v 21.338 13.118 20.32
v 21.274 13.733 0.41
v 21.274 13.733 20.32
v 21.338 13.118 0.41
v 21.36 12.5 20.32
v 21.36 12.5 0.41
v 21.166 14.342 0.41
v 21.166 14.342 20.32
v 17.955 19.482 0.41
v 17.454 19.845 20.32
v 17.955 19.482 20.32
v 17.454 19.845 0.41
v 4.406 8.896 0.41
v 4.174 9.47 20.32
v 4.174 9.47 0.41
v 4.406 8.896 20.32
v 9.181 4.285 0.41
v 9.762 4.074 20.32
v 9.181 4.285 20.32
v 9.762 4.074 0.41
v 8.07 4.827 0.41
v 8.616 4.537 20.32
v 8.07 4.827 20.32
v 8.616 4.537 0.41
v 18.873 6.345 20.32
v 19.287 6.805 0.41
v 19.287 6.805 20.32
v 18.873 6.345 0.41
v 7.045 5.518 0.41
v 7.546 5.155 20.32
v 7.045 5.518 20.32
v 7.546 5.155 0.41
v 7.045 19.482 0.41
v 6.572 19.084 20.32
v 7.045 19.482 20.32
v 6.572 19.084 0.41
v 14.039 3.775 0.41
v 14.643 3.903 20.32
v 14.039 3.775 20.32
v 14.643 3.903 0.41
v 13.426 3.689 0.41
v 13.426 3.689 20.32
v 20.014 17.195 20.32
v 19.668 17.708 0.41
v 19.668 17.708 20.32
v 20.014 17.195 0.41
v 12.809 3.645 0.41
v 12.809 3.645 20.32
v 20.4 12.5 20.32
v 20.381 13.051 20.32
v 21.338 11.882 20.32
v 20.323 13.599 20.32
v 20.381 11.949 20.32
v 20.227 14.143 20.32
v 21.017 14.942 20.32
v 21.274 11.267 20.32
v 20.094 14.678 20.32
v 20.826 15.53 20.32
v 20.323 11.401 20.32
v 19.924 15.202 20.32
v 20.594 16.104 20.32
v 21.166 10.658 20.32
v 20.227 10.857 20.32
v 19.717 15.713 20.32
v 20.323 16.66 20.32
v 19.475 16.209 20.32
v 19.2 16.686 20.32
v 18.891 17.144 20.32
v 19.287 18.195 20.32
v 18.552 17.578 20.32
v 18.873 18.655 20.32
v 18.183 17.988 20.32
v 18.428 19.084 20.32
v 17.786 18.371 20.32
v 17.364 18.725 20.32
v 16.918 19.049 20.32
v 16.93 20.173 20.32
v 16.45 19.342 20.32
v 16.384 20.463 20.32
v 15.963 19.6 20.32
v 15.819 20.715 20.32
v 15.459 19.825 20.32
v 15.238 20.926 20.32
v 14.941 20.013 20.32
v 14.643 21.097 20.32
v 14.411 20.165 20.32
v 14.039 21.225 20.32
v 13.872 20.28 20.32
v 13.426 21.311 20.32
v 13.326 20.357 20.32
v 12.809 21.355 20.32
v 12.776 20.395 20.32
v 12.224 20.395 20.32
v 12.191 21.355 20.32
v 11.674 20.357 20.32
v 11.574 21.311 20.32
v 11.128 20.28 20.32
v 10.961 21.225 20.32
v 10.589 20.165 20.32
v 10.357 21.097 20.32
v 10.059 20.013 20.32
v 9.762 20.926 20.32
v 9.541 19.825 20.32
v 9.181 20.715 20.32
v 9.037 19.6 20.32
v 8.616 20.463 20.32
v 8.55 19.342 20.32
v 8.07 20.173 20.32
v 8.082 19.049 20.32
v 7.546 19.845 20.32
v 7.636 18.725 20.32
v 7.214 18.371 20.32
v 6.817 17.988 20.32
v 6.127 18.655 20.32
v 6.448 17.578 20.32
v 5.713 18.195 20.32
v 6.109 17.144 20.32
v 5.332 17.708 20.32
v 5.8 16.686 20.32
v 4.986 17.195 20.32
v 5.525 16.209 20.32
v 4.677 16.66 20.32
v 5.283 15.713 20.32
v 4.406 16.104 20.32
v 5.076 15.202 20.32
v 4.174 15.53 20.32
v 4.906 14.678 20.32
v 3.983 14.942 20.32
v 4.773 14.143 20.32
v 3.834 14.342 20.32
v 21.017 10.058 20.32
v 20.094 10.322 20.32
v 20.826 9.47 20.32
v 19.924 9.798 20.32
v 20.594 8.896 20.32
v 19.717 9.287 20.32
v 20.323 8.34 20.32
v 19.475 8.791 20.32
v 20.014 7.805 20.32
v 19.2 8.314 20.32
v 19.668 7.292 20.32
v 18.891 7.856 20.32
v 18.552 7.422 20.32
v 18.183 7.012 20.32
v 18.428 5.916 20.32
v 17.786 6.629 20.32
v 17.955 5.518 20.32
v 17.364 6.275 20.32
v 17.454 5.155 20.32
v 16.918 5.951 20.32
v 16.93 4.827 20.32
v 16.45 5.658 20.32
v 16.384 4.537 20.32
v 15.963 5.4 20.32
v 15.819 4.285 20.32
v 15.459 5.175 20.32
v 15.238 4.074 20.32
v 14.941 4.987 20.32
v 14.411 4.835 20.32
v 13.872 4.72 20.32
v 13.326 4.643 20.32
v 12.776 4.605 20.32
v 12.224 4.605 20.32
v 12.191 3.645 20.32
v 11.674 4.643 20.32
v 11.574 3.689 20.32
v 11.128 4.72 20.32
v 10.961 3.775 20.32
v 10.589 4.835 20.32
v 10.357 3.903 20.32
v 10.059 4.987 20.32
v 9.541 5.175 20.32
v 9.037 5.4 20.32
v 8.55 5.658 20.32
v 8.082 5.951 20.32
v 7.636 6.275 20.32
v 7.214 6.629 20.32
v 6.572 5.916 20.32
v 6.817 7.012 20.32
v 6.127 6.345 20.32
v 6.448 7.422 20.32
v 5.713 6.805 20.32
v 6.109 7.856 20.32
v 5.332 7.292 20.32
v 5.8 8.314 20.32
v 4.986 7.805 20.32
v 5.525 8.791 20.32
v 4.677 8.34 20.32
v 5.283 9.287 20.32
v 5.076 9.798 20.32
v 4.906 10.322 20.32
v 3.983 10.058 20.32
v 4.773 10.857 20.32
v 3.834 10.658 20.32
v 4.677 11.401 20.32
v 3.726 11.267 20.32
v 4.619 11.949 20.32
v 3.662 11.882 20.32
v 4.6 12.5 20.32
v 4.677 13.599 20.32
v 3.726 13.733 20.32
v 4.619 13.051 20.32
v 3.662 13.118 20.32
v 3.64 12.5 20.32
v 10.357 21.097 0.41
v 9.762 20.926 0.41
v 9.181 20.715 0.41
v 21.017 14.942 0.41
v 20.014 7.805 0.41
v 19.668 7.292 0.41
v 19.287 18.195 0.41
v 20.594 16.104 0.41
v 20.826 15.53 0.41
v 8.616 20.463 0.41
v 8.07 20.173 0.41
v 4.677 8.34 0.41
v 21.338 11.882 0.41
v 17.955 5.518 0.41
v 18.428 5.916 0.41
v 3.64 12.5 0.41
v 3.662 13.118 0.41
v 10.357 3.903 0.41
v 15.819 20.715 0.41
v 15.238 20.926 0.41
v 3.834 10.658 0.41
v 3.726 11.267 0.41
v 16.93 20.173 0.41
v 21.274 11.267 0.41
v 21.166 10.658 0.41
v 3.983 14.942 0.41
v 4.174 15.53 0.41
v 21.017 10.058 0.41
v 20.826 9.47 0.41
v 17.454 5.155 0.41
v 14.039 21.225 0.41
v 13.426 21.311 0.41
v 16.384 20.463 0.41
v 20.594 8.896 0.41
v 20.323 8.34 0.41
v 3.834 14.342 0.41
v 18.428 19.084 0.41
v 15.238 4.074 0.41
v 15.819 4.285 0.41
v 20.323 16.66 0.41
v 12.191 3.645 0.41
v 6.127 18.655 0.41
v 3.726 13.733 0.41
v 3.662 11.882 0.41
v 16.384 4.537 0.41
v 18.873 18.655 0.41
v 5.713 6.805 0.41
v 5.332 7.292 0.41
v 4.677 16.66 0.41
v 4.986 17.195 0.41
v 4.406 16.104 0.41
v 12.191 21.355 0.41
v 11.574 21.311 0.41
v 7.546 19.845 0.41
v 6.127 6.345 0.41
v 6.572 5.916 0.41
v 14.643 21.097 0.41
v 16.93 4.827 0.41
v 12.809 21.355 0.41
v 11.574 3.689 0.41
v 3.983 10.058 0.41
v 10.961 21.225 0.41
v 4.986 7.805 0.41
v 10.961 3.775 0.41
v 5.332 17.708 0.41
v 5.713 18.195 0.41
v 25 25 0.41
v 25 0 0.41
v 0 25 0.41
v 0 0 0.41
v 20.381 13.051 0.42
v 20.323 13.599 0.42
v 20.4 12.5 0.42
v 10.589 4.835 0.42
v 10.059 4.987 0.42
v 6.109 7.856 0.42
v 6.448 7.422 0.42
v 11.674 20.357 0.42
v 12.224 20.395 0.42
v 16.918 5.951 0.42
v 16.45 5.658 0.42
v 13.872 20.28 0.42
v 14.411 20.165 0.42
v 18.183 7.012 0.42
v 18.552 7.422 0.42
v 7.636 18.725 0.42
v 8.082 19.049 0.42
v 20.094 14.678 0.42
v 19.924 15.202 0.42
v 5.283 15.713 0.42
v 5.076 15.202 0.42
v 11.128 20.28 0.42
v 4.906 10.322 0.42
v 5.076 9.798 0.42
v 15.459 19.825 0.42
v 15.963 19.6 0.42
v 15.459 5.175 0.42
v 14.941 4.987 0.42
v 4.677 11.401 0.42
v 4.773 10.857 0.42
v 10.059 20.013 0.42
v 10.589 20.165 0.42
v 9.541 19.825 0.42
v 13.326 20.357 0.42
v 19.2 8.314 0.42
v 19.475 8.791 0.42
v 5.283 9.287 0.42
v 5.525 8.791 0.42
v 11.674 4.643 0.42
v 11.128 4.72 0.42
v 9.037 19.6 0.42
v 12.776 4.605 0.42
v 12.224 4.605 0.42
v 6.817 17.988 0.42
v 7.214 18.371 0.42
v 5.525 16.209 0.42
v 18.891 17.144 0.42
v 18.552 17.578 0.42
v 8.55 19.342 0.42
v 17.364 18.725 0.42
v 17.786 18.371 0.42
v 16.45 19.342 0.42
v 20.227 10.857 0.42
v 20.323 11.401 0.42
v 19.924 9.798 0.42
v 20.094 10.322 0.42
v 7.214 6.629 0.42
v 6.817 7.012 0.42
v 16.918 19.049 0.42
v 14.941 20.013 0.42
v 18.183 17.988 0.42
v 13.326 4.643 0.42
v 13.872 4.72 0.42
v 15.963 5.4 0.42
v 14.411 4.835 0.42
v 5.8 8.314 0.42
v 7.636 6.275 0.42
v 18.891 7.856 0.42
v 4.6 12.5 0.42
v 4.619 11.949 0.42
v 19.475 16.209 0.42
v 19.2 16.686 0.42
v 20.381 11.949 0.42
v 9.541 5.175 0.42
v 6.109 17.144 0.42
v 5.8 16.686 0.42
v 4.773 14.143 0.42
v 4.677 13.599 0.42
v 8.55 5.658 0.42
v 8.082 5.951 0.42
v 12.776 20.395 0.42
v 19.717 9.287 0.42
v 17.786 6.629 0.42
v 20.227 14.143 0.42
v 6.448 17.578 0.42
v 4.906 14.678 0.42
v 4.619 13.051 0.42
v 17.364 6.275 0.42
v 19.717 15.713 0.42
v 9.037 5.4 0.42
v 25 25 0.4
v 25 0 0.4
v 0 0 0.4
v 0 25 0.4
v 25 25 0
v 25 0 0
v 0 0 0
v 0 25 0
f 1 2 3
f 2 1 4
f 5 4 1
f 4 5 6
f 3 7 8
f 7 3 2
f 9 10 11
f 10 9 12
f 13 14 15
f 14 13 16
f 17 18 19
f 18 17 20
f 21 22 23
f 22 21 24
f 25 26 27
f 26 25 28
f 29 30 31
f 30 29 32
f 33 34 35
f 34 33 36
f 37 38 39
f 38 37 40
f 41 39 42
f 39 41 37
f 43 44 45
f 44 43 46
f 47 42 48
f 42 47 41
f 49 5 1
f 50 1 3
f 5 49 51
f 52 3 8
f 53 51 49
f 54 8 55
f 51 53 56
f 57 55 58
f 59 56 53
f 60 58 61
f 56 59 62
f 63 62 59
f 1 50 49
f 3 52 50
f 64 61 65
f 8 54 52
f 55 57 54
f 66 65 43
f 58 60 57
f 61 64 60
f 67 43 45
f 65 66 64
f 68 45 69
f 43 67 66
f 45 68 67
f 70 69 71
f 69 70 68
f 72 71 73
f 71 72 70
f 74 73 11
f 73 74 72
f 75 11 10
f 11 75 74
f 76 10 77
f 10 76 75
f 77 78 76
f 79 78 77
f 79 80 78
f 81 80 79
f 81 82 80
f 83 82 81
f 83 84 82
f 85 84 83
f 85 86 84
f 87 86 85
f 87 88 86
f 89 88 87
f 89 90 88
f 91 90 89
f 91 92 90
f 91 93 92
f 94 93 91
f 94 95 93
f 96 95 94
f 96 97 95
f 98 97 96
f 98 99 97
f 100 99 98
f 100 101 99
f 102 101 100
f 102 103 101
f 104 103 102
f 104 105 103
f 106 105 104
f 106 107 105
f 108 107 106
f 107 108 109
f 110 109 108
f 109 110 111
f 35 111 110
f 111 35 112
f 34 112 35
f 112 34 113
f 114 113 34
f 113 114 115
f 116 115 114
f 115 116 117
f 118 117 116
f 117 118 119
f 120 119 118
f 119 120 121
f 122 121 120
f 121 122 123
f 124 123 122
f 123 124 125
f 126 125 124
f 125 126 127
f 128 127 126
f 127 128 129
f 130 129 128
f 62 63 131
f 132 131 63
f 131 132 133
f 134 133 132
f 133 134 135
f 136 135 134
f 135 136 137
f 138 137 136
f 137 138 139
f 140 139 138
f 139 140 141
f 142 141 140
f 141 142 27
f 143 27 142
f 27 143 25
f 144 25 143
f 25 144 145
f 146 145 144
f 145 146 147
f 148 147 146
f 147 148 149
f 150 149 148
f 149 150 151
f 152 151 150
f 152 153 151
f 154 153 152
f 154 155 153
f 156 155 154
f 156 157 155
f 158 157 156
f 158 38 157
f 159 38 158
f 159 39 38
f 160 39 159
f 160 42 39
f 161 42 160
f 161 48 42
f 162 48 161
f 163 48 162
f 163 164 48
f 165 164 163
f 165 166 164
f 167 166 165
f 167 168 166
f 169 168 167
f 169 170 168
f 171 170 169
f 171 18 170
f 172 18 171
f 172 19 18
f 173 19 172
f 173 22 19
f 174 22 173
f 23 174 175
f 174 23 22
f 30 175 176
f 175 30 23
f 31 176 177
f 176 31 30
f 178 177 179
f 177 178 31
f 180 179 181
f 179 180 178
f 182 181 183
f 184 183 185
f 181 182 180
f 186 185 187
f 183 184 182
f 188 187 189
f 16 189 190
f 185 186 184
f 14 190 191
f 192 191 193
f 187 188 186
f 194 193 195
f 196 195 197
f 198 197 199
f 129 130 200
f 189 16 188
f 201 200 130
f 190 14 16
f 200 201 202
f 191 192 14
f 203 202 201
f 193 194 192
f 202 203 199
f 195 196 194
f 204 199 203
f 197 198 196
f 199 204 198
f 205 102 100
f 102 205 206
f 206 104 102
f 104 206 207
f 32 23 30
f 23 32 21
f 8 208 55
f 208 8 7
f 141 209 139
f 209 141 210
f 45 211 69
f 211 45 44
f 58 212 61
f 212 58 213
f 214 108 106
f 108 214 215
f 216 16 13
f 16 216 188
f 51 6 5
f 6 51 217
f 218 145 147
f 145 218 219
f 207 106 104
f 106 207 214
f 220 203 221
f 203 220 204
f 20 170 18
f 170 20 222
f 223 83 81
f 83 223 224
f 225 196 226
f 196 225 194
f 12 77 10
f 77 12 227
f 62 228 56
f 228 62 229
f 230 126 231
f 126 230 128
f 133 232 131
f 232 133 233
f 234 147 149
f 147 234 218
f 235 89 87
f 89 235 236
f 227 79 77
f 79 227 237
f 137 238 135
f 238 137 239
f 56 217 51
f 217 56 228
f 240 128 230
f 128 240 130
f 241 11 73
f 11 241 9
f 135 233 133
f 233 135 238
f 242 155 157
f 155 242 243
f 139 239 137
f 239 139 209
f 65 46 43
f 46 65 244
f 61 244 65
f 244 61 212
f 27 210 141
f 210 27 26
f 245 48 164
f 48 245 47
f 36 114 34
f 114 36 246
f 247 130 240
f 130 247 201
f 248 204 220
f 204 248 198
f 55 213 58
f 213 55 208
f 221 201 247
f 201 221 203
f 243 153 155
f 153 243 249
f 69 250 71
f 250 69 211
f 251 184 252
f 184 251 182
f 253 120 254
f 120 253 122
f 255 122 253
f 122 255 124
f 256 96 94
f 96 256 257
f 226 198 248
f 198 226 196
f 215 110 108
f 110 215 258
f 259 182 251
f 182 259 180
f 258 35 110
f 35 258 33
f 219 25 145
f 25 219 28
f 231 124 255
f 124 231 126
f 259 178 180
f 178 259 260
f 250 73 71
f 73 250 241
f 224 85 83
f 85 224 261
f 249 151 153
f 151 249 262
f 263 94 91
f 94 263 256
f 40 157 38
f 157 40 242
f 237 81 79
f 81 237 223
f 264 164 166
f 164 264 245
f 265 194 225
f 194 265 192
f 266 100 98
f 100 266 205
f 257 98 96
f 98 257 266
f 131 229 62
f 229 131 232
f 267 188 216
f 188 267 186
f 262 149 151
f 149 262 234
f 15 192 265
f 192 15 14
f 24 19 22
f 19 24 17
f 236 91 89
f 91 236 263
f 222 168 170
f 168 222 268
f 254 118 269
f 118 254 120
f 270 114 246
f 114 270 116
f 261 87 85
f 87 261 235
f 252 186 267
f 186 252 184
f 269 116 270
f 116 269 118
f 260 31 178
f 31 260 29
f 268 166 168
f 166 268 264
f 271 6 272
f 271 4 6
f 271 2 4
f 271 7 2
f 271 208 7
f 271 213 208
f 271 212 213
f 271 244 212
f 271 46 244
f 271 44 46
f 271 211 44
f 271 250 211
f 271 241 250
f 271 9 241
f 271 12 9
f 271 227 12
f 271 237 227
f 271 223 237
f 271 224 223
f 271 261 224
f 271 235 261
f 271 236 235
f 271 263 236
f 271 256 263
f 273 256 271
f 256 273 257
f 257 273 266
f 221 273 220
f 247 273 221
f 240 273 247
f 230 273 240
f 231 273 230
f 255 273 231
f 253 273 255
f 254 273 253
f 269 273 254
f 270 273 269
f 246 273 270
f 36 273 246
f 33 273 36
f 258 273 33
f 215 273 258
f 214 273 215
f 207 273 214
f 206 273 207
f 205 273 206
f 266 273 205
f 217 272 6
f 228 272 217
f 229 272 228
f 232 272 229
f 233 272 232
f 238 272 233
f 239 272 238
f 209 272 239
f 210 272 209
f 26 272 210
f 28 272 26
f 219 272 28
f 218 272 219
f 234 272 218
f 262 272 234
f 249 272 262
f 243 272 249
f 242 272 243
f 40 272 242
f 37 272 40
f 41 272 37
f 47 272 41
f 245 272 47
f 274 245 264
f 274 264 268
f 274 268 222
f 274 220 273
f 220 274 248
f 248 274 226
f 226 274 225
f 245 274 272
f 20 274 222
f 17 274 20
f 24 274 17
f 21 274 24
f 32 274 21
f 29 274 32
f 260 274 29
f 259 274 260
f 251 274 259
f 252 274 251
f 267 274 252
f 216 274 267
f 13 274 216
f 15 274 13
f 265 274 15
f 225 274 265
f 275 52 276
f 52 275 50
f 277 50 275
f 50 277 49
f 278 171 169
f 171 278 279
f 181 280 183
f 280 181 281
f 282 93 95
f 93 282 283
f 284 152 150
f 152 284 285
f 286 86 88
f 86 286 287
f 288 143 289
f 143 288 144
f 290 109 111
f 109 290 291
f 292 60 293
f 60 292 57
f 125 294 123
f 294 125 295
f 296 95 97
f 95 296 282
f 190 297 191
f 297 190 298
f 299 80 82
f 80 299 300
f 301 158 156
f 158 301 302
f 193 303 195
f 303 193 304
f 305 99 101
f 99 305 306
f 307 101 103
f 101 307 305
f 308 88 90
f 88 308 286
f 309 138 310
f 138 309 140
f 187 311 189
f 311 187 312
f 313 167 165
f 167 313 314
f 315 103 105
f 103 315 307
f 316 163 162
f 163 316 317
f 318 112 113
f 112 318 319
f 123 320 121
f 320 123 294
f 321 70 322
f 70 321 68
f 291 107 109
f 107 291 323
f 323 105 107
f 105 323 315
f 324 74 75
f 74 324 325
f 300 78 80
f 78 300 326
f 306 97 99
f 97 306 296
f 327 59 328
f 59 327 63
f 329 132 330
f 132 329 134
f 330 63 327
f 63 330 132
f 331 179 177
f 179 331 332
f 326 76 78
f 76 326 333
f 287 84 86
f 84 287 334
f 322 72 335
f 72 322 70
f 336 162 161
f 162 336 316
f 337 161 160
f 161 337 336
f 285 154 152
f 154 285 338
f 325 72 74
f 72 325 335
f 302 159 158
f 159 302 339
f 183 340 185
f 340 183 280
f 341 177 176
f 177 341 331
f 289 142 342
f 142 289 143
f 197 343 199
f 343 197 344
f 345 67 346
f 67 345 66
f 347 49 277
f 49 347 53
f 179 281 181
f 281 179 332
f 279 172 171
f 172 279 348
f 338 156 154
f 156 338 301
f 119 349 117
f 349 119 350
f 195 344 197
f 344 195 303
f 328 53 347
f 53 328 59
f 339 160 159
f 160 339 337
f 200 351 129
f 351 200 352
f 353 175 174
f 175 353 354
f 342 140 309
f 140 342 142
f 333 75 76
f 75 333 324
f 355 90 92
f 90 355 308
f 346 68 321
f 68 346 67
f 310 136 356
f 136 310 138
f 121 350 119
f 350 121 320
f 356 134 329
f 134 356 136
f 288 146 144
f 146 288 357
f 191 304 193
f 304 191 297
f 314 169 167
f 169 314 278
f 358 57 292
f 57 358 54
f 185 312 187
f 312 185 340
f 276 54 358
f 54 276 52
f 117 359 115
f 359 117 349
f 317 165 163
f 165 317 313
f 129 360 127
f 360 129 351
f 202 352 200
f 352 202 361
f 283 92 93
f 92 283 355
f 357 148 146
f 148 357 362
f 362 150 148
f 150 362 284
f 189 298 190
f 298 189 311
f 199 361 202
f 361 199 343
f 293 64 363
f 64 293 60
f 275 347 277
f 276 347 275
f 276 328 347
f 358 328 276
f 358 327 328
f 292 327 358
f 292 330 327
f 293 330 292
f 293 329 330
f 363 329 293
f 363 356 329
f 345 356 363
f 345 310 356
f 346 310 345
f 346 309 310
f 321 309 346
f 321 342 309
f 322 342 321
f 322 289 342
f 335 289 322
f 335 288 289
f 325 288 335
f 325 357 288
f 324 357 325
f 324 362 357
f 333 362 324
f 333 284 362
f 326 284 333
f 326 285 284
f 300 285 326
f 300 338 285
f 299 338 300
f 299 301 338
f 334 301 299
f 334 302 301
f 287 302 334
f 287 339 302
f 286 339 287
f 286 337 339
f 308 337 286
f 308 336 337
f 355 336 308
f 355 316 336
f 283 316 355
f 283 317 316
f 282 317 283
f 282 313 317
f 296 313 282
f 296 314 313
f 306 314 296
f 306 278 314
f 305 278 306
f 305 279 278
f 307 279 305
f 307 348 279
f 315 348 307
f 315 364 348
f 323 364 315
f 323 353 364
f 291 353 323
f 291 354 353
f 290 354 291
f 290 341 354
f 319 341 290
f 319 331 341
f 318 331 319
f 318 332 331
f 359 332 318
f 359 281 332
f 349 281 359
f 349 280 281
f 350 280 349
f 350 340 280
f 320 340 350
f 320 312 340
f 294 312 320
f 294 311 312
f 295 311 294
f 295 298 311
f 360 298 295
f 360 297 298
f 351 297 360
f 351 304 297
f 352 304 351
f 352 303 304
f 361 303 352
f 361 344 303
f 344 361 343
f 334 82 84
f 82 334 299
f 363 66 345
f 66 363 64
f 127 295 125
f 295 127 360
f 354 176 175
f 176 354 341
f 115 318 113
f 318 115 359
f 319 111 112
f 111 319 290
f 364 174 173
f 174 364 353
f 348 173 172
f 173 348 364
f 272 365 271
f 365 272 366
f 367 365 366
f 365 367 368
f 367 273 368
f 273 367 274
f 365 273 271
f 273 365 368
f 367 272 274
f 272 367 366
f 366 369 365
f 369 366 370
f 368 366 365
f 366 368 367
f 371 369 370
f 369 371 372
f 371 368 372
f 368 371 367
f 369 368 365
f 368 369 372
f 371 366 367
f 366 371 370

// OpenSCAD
// file: ../../Base/PlacementOptions.scad
// Fischertechnik Box Foundation
// Placement Options

// Alignment
NoAlign = 0;
AlignLeft = 1;
AlignBottom = 2;
AlignCenter = 3;
AlignRight = 4;
AlignTop = 5;

// Element rotation degree steps
rotations = [0, -90, -180, -270];

// Rotation
NoRotation = 0;
Rotate0 = 0;
Rotate90 = 1;
Rotate180 = 2;
Rotate270 = 3;

// Docking (seen from above)
NoDock = -1;
DockLeft = 0;
DockTop = 1;
DockRight = 2;
DockCorner = 2;
DockBottom = 3;

// Web corners
LowerLeft = 0;
UpperLeft = 1;
UpperRight = 2;
LowerRight = 3;

// Web position relative to corner
LeftOfCorner = 0;
RightOfCorner = 1;
// file: ../../Base/Boxes.scad
// Fischertechnik Box Foundation
// Pre-designed Boxes

use <Constants.scad>

include <PlacementOptions.scad>

box190Width = 190;
box190Depth = 130;
box130Width = 130;
box130Depth = 95;
boxUsageHeight = 33.9;
boxWallThickness = 2.4;
boxBaseThickness = 1.0;
boxWebWidth = 3.0;

// getBoxWallThickness()
// Gets the wall thickness of a Fischertechnik Box

function getBoxWallThickness() = boxWallThickness;

// Gets the usable height of a fischertechnik box
function getBoxUsageHeight() = boxUsageHeight;

// Gets the thickness of the Fischertechnik box base.
function getBoxBaseThickness() = boxBaseThickness;

// Gets the width of a box web
function getBoxWebWidth() = boxWebWidth;

// Gets the usable inner space of a Box 190 as an x/y-list
function getBox190Space() = [
    box190Width - 2*getBoxWallThickness(), 
    box190Depth - 2*getBoxWallThickness() ];

// Imports the Fischertechnik empty box 130x190 mm and places it at position 0,0
// 190x130 are the outer sizes, the inner space is slightly smaller. Use getBox190Space() to get the inner sizes.
// This module needs the STL file "Fischertechnik Box 130x190.stl" in the library path.
// The box is positioned that the usable inner space is at the 0,0,0 position. The

module Box190() {
    translate([-getBoxWallThickness(),-getBoxWallThickness(),-getBoxBaseThickness()])
        import("Fischertechnik Box 130x190.stl", convexity=3);
}

// Gets the usable inner space of a Box 130 as an x/y-list
function getBox130Space() = [
    box130Width - 2*getBoxWallThickness(), 
    box130Depth - 2*getBoxWallThickness() ];

// Imports the Fischertechnik empty box 95x130 mm and places it at position 0,0
// 190x130 are the outer sizes, the inner space is slightly smaller. Use getBox190Space() to get the inner sizes.
// This module needs the STL file "Fischertechnik Box 95x130.stl" in the library path.
// The box is positioned that the usable inner space is at the 0,0,0 position. The

module Box130() {
    translate([-getBoxWallThickness(),-getBoxWallThickness(),-getBoxBaseThickness()])
        import("Fischertechnik Box 95x130.stl", convexity=3);
}

// Creates a web at the specified box walls
// corner 0 = LowerLeft, 1 = UpperLeft, 2 = UpperRight, 3 = LowerRight
// side 0 = LeftOfCorner, 1 = RightOfCorner
// distance = Distance in mm from the corner
// box = inner width and depth of the box (default: Box 190)
// webWidth = length of the web (default is 3 mms)
// webThickness = thickness of the web (default is 1 mm)

module BoxWeb(corner, side, distance, box=getBox190Space(), webWidth=getBoxWebWidth(), webThickness=1.0) {
    sink = getBoxWallThickness()/2;

    width = (corner % 2 == 0) ? 
            (side == LeftOfCorner ? webWidth : webThickness) :
            (side == LeftOfCorner ? webThickness : webWidth);

    depth = (corner % 2 == 0) ? 
            (side == RightOfCorner ? webWidth : webThickness) :
            (side == RightOfCorner ? webThickness : webWidth);
    
    xDiff = corner == LowerLeft ? 
                (side == LeftOfCorner ? -sink : distance) :
            (corner == UpperLeft ?                
                (side == LeftOfCorner ? distance : -sink) :
            (corner == UpperRight ?
                (side == LeftOfCorner ? box.x-webWidth+sink : box.x-distance-webThickness) :
                (side == LeftOfCorner ? box.x-distance-webThickness: box.x-webWidth+sink)));

    yDiff = corner == LowerLeft ? 
                (side == RightOfCorner ? -sink : distance) :
            (corner == UpperLeft ?
                (side == RightOfCorner ? box.y-distance : box.y-webWidth+sink) :
            (corner == UpperRight ?
                (side == RightOfCorner ? box.y-webWidth+sink : box.y-distance) :
                (side == RightOfCorner ? distance : -sink)));
    
    translate([xDiff, yDiff, -getExcess()])
        cube([width, depth, boxUsageHeight + 2*getExcess()]);
}
// file: ../../Base/Rotation.scad
// Fischertechnik Box Foundation
// Geometry Helpers Rotation

include <PlacementOptions.scad>

// getRotatedSpace(space, rotation=NoRotation)
// Rotates the space dependent on the specified rotation

function getRotatedSpace(space, rotation=NoRotation) = [
    (rotation == Rotate90 || rotation == Rotate270) ? space.y : space.x,
    (rotation == Rotate90 || rotation == Rotate270) ? space.x : space.y
];

// Rotates the given space around the fixed left lower corner
// space = the space the children needs as width/depth list [width,depth]
// rotation = 0 Rotate0 degrees, 1 Rotate90 degrees, 2 Rotate180 degrees, 3 Rotate270 degrees (equivalent to -90)

module RotateFix(space, rotation=Rotate0) {
    dy = (rotation == Rotate0 || rotation == Rotate270) ? 0 :
        (rotation == Rotate90) ? space.x :
        space.y;
    dx = (rotation < Rotate180) ? 0 :
        (rotation == Rotate180) ? space.x :
        space.y;
    
    translate([dx, dy, 0])
        rotate([0, 0, rotations[rotation]])
            children();
}
// file: ../../Base/Alignment.scad
// Fischertechnik Box Foundation
// Geometry Helpers Alignment

include <PlacementOptions.scad>

// getAlignedX(elementWidth, spaceWidth, align=AlignRight, offset=0)
// Gets the aligned X offset of an element with the given
// width in the given space.
// elementWidth = The width of the element to positon
// spaceWidth = The space where the element should be aligned
// align = 0 AlignLeft, 1 AlignCenter, 2 AlignRight
// offset = an optional offset from the aligned position. When
// aligned left or centered, then positive values are in X direction.
// When aligned right then positive values are in negative X direction.

function getAlignedX(elementWidth, spaceWidth, align=AlignRight, offset=0) =
    (align == AlignLeft) ?
        offset :
        ((align == AlignCenter) ?
        (spaceWidth - elementWidth)/2 + offset :
        spaceWidth - offset - elementWidth);

// getAlignedY(elementDepth, spaceDepth, align=AlignTop, offset=0)
// Gets the aligned Y offset of an element with the given
// depth in the given space.
// elementDepth = The depth of the element to positon
// spaceDepth = The space where the element should be aligned
// align = 0 AlignBottom, 1 AlignCenter, 2 AlignTop
// offset = an optional offset from the aligned position. When
// aligned bottom or centered, then positive values are in Y direction.
// When aligned top then positive values are in negative Y direction.

function getAlignedY(elementDepth, spaceDepth, align=AlignTop, offset=0) =
    (align == AlignBottom) ?
        offset :
        ((align == AlignCenter) ?
        (spaceDepth - elementDepth)/2 + offset :
        spaceDepth - offset - elementDepth);
// file: ../../Base/Placement.scad
// Fischertechnik Box Foundation
// Geometry Helpers Placement

use <Constants.scad>
use <Alignment.scad>
use <Rotation.scad>
use <Boxes.scad>

include <PlacementOptions.scad>

// Place(x=0, y=0, elementSpace=[0,0], alignX=AlignLeft, alignY=AlignBottom, rotation=Rotate0, boxSpace=getBox190Space())
// Places the child at the specified position
// y = Y-Position. This is a relative position when an X aligment is specified.
// x = X-Position. This is a relative position when an Y aligment is specified.
// elementSpace = space of the element to be placed [x,y]
// alignX = -1=NoAlign, 0 AlignLeft, 1 AlignCenter, 3 AlignRight (elementSpace and boxSpace required!)
// alignY = -1=NoAlign, 2 AlignBottom, 1 AlignCenter, 4 AlignTop (elementSpace and boxSpace required!)
// rotation = 0 Rotate0 0 degrees, 1 Rotate90 90 degrees, 
// 2 Rotate180 180 degrees, 3 Rotate270 270 degrees (equivalent to -90)
// boxSpace = Inner space of the box where the placement occurs [x,y] - default is Box 190x130 inner space

module Place(x=0, y=0, elementSpace=[0,0], 
  alignX=AlignLeft, alignY=AlignBottom, 
  rotation=NoRotation, boxSpace=getBox190Space()) {

    module Position(x, y, space, rotation=Rotate0) {
        translate([x, y, 0])
            RotateFix(space, rotation)
                children();
    }

    space = getRotatedSpace(elementSpace, rotation);
    alignedX = getAlignedX(space.x, boxSpace.x, alignX, x);
    alignedY = getAlignedY(space.y, boxSpace.y, alignY, y);
    Position(alignedX, alignedY, elementSpace, rotation)
        children();
}

// Center(space=getBox130Space(), elementSpace=[0,0])
// space = Space where the children is centered. For cylinder use centered=true and no elementSpace.
// elementSpace = space of the element to be centered [x,y]

module Center(space=getBox190Space(), elementSpace=[0,0]) {
    translate([(space.x - elementSpace.x) / 2, (space.y - elementSpace.y) / 2])
        children(0);
}

// CenterHorizontal(width=0, y=0, offset=0, space=getBox130Space())
// space = Space where the children is centered. For cylinder use centered=true and no elementSpace.
// elementSpace = space of the element to be centered [x,y]

module CenterHorizontal(width=0, y=0, offset=0, space=getBox190Space()) {
    translate([(space.x - width) / 2 + offset, y])
        children(0);
}

// CenterVertical(depth=0, x=0, offset=0, space=getBox130Space())
// space = Space where the children is centered. For cylinder use centered=true and no elementSpace.
// elementSpace = space of the element to be centered [x,y]

module CenterVertical(depth=0, x=0, offset=0, space=getBox190Space()) {
    translate([x, (space.y - depth) / 2 + offset])
        children(0);
}
// file: ../../Elements/AxisClip10.scad
// Fischertechnik Box Library
// Axis for clip 10
// 31023

use <../ModelBase/Simple.scad>

width = 12;
depth = 12;
height = 23;

// getAxisClip10Space()
// Gets the space of a frame for a clip 10 with spring ring (mot2)

function getAxisClip10Space() = [width, depth, height];

// AxisClip10()
// Axis for clip 10 with spring ring (mot2)

module AxisClip10() {
    LeveledAxisWithSpace(height, height-10, getAxisClip10Space());
}

// Tests
color("lightgray")
AxisClip10();
// file: ../../Base/Constants.scad
// Fischertechnik Box Foundation
// Constants

// Constant values necessary for multiple elements

// Base constants
dividerThickness = 1.2;
excess = 0.01;
fragments = 90;
tolerance = 0.8;

// Gets the thickness of a divider 
function getDividerThickness() = dividerThickness;

// Gets the excess that is used to merge walls into each other
function getExcess() = excess;

// Gets amount of fragments of a cylinder
function getFragments() = fragments;

// Gets the inner tolerance of a frame to each side
function getTolerance() = tolerance;


// Fischertechnik specific constants
axisDiameter = 4;
axisBottomDiameter = axisDiameter + 1;
standardEdgeDistance = 2.5;
standardWebDistance = 11.5;
standardCornerLength = 15;
tubeWallFactor = 0.8;

// Gets axis diameter
function getAxisDiameter() = axisDiameter;

// Gets axis bottom diameter for thicker part at the bottom
function getAxisBottomDiameter() = axisBottomDiameter;

// gets the standard distance to the wall of the box for dockable frames with webs
function getStandardEdgeDistance() = standardEdgeDistance;

// gets the standard distance of each web to the corner of the dockable frame
function getStandardWebDistance() = standardWebDistance;

// gets the standard length of the corner walls of a dockable frame
function getStandardCornerLength() = standardCornerLength;

// gets the wall thickness of a tube.
function getTubeWallThickness() = tubeWallFactor * getDividerThickness();
// file: ../../Elements/CylinderWheel23.scad
// Fischertechnik Box Library
// Cylinder for Wheel 23 with Axis 
// 36581, 35586

use <../Base/Constants.scad>
use <../Base/Placement.scad>
use <../ModelBase/Simple.scad>

width = 25;
depth = 25;

// getCylinderWheel23Space()
// Gets the space the cylinder wheel 23 needs as width and depth (.x and .y as a list)

function getCylinderWheel23Space() = [width, depth];

// CylinderWheel23()
// Standing cylinder for wheel 23 with axis.
// 36581, 35586

module CylinderWheel23() {
    diameter = 15.8;
    height = 19.9;

    Space(getCylinderWheel23Space());
    
    Center(getCylinderWheel23Space())
        Tube(height, innerDiameter=diameter);
}

// Tests
color("lightgray")
CylinderWheel23();
// file: ../TestPrint.scad
// 3D Print Test Base

use <../Base/Constants.scad>

use <../Elements/AxisClip10.scad>

module TestPrint(elementSpace) {
    cube([elementSpace.x, elementSpace.y, 0.4]);
    translate([0,0,0.4+getExcess()]) {
        children();
    }
}

TestPrint(getAxisClip10Space())
    AxisClip10();
// main file
// 3D Print Test Base
// CylinderWheel23

use <../TestPrint.scad>
use <../../Elements/CylinderWheel23.scad>

TestPrint(getCylinderWheel23Space())
    CylinderWheel23();
